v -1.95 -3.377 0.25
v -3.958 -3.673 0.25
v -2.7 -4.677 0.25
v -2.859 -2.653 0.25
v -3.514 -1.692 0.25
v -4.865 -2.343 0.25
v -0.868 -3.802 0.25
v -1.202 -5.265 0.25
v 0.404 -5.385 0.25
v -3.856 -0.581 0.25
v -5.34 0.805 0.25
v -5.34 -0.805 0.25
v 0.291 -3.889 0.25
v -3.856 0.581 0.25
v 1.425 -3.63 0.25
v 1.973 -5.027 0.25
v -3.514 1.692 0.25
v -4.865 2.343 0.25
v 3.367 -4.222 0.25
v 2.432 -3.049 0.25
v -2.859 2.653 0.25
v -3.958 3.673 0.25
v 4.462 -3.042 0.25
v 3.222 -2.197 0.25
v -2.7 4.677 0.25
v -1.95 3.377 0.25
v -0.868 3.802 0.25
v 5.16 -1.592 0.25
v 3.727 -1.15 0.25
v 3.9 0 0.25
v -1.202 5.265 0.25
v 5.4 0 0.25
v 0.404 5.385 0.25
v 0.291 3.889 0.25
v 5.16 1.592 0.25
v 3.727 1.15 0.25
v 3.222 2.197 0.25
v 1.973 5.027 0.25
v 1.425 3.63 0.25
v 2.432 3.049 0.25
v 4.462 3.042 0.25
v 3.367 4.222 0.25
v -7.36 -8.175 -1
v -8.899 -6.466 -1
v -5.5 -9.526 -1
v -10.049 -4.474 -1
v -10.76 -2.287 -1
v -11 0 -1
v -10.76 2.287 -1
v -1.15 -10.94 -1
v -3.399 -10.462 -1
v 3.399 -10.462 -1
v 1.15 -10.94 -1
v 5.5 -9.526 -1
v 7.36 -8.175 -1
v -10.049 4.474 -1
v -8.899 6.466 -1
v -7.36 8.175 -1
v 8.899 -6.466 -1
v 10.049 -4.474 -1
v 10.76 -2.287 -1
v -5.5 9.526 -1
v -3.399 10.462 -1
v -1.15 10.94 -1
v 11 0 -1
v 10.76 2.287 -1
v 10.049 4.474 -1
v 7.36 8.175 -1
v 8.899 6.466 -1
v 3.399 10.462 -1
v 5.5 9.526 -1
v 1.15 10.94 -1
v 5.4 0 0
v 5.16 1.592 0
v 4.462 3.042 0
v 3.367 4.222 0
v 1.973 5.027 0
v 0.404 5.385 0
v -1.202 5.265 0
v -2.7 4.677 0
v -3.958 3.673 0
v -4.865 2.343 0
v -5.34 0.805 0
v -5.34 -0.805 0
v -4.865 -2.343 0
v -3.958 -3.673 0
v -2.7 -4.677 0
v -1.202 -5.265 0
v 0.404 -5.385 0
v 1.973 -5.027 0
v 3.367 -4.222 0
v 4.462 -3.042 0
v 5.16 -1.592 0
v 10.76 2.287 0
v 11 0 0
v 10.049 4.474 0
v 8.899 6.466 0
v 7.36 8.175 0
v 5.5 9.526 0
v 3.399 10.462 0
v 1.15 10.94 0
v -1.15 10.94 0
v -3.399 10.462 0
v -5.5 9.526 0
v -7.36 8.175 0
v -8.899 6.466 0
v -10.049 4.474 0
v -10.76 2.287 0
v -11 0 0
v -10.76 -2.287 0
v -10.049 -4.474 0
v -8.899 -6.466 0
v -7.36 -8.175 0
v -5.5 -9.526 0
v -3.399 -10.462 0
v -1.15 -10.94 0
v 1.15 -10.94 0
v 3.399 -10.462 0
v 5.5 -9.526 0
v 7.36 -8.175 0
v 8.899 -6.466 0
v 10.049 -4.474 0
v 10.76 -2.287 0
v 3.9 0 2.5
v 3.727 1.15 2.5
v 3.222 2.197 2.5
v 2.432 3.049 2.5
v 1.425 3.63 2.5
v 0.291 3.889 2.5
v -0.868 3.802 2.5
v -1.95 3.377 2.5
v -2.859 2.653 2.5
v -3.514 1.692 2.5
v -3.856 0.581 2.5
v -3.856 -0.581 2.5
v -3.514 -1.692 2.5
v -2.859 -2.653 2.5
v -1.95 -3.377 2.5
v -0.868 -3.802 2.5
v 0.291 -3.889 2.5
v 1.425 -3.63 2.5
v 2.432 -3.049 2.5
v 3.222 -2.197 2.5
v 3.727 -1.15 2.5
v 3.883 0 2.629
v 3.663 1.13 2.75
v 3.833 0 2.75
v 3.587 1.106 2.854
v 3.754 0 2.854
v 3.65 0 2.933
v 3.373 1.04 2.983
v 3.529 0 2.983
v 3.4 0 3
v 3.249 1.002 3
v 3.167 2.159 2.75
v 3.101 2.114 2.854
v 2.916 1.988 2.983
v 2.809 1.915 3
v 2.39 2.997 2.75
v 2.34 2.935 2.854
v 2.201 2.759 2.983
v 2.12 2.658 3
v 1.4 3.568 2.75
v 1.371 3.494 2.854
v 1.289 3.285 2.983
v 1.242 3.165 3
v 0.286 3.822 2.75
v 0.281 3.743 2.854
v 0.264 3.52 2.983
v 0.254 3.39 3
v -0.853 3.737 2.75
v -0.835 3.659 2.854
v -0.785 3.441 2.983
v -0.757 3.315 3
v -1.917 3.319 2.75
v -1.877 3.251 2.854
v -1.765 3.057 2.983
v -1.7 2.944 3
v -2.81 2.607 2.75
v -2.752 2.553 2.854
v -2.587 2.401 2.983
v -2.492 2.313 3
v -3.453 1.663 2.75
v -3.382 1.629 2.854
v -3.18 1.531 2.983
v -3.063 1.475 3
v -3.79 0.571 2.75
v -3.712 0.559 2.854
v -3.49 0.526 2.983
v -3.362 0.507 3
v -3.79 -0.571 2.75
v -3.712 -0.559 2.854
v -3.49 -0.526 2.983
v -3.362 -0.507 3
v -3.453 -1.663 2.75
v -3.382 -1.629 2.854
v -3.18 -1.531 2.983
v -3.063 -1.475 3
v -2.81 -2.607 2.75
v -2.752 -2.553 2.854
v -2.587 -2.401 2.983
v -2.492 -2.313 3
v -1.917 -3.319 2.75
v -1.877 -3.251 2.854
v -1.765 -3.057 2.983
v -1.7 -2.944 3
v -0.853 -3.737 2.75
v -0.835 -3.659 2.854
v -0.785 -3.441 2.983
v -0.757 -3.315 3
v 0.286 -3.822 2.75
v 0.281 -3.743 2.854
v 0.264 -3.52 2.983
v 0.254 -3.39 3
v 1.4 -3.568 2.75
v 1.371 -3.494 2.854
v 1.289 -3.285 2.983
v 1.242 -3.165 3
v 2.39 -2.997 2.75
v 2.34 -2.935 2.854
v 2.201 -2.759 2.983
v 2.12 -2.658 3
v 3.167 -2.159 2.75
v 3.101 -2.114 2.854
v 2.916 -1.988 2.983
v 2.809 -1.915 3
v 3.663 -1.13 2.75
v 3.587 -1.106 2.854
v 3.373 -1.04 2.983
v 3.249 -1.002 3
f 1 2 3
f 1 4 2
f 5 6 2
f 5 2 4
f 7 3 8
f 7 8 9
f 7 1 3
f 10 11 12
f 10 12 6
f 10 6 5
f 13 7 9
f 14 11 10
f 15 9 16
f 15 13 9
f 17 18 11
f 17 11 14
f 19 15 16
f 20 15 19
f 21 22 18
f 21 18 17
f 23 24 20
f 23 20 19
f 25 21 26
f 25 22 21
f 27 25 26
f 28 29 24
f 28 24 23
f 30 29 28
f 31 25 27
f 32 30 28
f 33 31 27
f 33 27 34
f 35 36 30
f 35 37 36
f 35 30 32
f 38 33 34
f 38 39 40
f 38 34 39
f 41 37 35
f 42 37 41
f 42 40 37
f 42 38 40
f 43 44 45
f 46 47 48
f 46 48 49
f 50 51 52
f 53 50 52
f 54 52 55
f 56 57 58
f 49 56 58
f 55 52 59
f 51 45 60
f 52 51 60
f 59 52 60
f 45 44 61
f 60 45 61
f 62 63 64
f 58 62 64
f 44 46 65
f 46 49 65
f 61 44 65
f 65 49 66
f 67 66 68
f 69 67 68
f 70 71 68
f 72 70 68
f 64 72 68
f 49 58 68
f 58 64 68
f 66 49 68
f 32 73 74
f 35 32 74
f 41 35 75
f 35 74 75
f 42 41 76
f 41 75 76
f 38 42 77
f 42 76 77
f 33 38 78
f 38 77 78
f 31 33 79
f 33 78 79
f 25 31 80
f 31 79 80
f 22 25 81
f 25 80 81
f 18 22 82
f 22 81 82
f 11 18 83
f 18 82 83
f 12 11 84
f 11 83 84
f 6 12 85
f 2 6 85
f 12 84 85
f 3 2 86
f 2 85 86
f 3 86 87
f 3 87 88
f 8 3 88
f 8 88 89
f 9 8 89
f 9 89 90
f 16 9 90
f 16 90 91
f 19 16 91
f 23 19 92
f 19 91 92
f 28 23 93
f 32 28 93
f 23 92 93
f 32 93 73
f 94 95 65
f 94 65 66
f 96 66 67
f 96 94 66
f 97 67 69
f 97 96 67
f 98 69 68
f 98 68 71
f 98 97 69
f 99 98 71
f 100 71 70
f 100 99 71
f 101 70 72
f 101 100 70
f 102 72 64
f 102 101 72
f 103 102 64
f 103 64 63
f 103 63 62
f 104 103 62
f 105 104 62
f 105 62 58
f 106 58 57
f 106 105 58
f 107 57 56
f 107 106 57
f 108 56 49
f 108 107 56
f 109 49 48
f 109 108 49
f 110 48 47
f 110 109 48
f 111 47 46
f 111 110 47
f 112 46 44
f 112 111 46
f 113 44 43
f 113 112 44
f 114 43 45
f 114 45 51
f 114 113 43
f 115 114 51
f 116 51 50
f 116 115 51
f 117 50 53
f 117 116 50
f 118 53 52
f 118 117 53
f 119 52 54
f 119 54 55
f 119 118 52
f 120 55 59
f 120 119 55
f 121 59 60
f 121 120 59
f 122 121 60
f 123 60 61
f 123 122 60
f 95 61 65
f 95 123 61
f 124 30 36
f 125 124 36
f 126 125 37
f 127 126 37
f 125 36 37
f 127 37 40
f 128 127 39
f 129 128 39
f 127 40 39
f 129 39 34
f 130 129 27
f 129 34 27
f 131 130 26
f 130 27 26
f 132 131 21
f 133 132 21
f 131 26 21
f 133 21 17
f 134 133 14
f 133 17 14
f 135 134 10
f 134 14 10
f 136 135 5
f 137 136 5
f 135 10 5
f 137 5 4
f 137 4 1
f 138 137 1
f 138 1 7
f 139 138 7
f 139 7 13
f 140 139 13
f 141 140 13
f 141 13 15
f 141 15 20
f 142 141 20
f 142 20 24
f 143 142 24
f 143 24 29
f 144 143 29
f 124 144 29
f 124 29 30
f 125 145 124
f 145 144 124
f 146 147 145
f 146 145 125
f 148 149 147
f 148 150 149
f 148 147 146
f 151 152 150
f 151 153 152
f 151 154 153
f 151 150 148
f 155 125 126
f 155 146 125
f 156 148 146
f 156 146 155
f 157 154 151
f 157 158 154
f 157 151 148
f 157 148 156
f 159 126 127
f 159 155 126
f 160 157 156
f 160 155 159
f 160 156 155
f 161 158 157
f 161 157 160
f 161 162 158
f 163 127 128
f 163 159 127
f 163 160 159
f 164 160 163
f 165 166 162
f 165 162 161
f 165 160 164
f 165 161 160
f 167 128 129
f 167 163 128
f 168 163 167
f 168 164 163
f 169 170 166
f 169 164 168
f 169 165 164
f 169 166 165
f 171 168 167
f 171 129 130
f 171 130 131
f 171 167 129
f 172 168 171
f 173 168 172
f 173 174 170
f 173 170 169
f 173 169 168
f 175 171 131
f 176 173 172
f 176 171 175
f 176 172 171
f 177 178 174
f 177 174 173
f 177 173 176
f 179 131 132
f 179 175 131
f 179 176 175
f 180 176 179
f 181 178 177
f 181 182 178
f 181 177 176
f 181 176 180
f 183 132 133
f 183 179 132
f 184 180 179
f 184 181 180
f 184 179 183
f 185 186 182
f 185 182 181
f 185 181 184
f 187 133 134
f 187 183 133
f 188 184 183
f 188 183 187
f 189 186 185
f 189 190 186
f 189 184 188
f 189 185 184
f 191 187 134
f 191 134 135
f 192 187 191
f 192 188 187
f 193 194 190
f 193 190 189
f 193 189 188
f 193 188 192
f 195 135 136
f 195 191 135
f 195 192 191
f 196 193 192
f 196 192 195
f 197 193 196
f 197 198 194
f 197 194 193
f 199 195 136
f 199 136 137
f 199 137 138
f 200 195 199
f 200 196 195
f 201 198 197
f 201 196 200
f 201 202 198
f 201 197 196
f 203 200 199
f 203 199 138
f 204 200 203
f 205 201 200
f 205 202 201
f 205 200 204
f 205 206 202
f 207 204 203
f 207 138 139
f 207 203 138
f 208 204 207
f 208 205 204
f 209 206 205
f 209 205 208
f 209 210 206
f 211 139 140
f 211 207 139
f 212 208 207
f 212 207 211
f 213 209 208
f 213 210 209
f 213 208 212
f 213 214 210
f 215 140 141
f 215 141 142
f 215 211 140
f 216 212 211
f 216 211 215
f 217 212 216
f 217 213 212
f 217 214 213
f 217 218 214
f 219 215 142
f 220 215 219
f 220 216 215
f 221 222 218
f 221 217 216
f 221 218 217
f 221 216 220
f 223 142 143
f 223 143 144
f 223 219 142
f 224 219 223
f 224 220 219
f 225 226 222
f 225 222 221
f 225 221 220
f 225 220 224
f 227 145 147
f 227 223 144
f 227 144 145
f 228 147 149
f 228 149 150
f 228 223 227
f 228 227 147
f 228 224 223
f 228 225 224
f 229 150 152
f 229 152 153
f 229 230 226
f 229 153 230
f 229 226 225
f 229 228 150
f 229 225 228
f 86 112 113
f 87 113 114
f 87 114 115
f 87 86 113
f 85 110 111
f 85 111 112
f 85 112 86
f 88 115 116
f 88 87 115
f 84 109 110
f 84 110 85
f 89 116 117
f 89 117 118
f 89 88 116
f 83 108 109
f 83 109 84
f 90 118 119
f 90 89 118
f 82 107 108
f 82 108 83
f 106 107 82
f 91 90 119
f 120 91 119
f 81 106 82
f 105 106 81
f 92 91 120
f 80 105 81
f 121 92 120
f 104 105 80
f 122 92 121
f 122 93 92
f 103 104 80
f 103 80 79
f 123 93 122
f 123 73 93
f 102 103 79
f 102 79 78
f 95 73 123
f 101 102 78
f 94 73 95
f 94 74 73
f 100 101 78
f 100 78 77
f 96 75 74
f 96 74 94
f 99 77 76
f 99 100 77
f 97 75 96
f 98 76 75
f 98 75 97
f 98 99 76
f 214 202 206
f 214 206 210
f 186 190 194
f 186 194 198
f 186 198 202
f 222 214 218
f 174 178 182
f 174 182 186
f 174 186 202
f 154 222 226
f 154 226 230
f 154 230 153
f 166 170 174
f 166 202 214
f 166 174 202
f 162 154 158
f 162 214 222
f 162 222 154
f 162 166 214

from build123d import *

# Parameters (mm, degrees)
F2_R     = 11
F2_R_2   = 5.4
F2_R_3   = 3.9
F3_DEPTH = 1
F4_DEPTH = 3
F5_DEPTH = 0.25
F6_R     = 0.5


# Not quite as in the source:
# - a feature names something its author has since deleted; it is built from what else it names


with BuildPart() as f3:
    # F2 (on Top) → F3 (new body)
    with BuildSketch(Plane.XY):
        Circle(F2_R)
        Circle(F2_R_2, mode=Mode.SUBTRACT)
        Circle(F2_R_2)
        Circle(F2_R_3, mode=Mode.SUBTRACT)
        Circle(F2_R_3)
    extrude(amount=-F3_DEPTH)

    # F2 (on Top) → F4 (join)
    with BuildSketch(Plane.XY):
        Circle(F2_R_3)
    extrude(amount=F4_DEPTH)

    # F2 (on Top) → F5 (join)
    with BuildSketch(Plane.XY):
        Circle(F2_R_2)
        Circle(F2_R_3, mode=Mode.SUBTRACT)
    extrude(amount=F5_DEPTH)

    # F6
    f6_edges = [f3.edges().sort_by_distance(p)[0] for p in [
        (-3.9, 0, 3),
    ]]
    fillet(f6_edges, radius=F6_R)


solid = f3.part
